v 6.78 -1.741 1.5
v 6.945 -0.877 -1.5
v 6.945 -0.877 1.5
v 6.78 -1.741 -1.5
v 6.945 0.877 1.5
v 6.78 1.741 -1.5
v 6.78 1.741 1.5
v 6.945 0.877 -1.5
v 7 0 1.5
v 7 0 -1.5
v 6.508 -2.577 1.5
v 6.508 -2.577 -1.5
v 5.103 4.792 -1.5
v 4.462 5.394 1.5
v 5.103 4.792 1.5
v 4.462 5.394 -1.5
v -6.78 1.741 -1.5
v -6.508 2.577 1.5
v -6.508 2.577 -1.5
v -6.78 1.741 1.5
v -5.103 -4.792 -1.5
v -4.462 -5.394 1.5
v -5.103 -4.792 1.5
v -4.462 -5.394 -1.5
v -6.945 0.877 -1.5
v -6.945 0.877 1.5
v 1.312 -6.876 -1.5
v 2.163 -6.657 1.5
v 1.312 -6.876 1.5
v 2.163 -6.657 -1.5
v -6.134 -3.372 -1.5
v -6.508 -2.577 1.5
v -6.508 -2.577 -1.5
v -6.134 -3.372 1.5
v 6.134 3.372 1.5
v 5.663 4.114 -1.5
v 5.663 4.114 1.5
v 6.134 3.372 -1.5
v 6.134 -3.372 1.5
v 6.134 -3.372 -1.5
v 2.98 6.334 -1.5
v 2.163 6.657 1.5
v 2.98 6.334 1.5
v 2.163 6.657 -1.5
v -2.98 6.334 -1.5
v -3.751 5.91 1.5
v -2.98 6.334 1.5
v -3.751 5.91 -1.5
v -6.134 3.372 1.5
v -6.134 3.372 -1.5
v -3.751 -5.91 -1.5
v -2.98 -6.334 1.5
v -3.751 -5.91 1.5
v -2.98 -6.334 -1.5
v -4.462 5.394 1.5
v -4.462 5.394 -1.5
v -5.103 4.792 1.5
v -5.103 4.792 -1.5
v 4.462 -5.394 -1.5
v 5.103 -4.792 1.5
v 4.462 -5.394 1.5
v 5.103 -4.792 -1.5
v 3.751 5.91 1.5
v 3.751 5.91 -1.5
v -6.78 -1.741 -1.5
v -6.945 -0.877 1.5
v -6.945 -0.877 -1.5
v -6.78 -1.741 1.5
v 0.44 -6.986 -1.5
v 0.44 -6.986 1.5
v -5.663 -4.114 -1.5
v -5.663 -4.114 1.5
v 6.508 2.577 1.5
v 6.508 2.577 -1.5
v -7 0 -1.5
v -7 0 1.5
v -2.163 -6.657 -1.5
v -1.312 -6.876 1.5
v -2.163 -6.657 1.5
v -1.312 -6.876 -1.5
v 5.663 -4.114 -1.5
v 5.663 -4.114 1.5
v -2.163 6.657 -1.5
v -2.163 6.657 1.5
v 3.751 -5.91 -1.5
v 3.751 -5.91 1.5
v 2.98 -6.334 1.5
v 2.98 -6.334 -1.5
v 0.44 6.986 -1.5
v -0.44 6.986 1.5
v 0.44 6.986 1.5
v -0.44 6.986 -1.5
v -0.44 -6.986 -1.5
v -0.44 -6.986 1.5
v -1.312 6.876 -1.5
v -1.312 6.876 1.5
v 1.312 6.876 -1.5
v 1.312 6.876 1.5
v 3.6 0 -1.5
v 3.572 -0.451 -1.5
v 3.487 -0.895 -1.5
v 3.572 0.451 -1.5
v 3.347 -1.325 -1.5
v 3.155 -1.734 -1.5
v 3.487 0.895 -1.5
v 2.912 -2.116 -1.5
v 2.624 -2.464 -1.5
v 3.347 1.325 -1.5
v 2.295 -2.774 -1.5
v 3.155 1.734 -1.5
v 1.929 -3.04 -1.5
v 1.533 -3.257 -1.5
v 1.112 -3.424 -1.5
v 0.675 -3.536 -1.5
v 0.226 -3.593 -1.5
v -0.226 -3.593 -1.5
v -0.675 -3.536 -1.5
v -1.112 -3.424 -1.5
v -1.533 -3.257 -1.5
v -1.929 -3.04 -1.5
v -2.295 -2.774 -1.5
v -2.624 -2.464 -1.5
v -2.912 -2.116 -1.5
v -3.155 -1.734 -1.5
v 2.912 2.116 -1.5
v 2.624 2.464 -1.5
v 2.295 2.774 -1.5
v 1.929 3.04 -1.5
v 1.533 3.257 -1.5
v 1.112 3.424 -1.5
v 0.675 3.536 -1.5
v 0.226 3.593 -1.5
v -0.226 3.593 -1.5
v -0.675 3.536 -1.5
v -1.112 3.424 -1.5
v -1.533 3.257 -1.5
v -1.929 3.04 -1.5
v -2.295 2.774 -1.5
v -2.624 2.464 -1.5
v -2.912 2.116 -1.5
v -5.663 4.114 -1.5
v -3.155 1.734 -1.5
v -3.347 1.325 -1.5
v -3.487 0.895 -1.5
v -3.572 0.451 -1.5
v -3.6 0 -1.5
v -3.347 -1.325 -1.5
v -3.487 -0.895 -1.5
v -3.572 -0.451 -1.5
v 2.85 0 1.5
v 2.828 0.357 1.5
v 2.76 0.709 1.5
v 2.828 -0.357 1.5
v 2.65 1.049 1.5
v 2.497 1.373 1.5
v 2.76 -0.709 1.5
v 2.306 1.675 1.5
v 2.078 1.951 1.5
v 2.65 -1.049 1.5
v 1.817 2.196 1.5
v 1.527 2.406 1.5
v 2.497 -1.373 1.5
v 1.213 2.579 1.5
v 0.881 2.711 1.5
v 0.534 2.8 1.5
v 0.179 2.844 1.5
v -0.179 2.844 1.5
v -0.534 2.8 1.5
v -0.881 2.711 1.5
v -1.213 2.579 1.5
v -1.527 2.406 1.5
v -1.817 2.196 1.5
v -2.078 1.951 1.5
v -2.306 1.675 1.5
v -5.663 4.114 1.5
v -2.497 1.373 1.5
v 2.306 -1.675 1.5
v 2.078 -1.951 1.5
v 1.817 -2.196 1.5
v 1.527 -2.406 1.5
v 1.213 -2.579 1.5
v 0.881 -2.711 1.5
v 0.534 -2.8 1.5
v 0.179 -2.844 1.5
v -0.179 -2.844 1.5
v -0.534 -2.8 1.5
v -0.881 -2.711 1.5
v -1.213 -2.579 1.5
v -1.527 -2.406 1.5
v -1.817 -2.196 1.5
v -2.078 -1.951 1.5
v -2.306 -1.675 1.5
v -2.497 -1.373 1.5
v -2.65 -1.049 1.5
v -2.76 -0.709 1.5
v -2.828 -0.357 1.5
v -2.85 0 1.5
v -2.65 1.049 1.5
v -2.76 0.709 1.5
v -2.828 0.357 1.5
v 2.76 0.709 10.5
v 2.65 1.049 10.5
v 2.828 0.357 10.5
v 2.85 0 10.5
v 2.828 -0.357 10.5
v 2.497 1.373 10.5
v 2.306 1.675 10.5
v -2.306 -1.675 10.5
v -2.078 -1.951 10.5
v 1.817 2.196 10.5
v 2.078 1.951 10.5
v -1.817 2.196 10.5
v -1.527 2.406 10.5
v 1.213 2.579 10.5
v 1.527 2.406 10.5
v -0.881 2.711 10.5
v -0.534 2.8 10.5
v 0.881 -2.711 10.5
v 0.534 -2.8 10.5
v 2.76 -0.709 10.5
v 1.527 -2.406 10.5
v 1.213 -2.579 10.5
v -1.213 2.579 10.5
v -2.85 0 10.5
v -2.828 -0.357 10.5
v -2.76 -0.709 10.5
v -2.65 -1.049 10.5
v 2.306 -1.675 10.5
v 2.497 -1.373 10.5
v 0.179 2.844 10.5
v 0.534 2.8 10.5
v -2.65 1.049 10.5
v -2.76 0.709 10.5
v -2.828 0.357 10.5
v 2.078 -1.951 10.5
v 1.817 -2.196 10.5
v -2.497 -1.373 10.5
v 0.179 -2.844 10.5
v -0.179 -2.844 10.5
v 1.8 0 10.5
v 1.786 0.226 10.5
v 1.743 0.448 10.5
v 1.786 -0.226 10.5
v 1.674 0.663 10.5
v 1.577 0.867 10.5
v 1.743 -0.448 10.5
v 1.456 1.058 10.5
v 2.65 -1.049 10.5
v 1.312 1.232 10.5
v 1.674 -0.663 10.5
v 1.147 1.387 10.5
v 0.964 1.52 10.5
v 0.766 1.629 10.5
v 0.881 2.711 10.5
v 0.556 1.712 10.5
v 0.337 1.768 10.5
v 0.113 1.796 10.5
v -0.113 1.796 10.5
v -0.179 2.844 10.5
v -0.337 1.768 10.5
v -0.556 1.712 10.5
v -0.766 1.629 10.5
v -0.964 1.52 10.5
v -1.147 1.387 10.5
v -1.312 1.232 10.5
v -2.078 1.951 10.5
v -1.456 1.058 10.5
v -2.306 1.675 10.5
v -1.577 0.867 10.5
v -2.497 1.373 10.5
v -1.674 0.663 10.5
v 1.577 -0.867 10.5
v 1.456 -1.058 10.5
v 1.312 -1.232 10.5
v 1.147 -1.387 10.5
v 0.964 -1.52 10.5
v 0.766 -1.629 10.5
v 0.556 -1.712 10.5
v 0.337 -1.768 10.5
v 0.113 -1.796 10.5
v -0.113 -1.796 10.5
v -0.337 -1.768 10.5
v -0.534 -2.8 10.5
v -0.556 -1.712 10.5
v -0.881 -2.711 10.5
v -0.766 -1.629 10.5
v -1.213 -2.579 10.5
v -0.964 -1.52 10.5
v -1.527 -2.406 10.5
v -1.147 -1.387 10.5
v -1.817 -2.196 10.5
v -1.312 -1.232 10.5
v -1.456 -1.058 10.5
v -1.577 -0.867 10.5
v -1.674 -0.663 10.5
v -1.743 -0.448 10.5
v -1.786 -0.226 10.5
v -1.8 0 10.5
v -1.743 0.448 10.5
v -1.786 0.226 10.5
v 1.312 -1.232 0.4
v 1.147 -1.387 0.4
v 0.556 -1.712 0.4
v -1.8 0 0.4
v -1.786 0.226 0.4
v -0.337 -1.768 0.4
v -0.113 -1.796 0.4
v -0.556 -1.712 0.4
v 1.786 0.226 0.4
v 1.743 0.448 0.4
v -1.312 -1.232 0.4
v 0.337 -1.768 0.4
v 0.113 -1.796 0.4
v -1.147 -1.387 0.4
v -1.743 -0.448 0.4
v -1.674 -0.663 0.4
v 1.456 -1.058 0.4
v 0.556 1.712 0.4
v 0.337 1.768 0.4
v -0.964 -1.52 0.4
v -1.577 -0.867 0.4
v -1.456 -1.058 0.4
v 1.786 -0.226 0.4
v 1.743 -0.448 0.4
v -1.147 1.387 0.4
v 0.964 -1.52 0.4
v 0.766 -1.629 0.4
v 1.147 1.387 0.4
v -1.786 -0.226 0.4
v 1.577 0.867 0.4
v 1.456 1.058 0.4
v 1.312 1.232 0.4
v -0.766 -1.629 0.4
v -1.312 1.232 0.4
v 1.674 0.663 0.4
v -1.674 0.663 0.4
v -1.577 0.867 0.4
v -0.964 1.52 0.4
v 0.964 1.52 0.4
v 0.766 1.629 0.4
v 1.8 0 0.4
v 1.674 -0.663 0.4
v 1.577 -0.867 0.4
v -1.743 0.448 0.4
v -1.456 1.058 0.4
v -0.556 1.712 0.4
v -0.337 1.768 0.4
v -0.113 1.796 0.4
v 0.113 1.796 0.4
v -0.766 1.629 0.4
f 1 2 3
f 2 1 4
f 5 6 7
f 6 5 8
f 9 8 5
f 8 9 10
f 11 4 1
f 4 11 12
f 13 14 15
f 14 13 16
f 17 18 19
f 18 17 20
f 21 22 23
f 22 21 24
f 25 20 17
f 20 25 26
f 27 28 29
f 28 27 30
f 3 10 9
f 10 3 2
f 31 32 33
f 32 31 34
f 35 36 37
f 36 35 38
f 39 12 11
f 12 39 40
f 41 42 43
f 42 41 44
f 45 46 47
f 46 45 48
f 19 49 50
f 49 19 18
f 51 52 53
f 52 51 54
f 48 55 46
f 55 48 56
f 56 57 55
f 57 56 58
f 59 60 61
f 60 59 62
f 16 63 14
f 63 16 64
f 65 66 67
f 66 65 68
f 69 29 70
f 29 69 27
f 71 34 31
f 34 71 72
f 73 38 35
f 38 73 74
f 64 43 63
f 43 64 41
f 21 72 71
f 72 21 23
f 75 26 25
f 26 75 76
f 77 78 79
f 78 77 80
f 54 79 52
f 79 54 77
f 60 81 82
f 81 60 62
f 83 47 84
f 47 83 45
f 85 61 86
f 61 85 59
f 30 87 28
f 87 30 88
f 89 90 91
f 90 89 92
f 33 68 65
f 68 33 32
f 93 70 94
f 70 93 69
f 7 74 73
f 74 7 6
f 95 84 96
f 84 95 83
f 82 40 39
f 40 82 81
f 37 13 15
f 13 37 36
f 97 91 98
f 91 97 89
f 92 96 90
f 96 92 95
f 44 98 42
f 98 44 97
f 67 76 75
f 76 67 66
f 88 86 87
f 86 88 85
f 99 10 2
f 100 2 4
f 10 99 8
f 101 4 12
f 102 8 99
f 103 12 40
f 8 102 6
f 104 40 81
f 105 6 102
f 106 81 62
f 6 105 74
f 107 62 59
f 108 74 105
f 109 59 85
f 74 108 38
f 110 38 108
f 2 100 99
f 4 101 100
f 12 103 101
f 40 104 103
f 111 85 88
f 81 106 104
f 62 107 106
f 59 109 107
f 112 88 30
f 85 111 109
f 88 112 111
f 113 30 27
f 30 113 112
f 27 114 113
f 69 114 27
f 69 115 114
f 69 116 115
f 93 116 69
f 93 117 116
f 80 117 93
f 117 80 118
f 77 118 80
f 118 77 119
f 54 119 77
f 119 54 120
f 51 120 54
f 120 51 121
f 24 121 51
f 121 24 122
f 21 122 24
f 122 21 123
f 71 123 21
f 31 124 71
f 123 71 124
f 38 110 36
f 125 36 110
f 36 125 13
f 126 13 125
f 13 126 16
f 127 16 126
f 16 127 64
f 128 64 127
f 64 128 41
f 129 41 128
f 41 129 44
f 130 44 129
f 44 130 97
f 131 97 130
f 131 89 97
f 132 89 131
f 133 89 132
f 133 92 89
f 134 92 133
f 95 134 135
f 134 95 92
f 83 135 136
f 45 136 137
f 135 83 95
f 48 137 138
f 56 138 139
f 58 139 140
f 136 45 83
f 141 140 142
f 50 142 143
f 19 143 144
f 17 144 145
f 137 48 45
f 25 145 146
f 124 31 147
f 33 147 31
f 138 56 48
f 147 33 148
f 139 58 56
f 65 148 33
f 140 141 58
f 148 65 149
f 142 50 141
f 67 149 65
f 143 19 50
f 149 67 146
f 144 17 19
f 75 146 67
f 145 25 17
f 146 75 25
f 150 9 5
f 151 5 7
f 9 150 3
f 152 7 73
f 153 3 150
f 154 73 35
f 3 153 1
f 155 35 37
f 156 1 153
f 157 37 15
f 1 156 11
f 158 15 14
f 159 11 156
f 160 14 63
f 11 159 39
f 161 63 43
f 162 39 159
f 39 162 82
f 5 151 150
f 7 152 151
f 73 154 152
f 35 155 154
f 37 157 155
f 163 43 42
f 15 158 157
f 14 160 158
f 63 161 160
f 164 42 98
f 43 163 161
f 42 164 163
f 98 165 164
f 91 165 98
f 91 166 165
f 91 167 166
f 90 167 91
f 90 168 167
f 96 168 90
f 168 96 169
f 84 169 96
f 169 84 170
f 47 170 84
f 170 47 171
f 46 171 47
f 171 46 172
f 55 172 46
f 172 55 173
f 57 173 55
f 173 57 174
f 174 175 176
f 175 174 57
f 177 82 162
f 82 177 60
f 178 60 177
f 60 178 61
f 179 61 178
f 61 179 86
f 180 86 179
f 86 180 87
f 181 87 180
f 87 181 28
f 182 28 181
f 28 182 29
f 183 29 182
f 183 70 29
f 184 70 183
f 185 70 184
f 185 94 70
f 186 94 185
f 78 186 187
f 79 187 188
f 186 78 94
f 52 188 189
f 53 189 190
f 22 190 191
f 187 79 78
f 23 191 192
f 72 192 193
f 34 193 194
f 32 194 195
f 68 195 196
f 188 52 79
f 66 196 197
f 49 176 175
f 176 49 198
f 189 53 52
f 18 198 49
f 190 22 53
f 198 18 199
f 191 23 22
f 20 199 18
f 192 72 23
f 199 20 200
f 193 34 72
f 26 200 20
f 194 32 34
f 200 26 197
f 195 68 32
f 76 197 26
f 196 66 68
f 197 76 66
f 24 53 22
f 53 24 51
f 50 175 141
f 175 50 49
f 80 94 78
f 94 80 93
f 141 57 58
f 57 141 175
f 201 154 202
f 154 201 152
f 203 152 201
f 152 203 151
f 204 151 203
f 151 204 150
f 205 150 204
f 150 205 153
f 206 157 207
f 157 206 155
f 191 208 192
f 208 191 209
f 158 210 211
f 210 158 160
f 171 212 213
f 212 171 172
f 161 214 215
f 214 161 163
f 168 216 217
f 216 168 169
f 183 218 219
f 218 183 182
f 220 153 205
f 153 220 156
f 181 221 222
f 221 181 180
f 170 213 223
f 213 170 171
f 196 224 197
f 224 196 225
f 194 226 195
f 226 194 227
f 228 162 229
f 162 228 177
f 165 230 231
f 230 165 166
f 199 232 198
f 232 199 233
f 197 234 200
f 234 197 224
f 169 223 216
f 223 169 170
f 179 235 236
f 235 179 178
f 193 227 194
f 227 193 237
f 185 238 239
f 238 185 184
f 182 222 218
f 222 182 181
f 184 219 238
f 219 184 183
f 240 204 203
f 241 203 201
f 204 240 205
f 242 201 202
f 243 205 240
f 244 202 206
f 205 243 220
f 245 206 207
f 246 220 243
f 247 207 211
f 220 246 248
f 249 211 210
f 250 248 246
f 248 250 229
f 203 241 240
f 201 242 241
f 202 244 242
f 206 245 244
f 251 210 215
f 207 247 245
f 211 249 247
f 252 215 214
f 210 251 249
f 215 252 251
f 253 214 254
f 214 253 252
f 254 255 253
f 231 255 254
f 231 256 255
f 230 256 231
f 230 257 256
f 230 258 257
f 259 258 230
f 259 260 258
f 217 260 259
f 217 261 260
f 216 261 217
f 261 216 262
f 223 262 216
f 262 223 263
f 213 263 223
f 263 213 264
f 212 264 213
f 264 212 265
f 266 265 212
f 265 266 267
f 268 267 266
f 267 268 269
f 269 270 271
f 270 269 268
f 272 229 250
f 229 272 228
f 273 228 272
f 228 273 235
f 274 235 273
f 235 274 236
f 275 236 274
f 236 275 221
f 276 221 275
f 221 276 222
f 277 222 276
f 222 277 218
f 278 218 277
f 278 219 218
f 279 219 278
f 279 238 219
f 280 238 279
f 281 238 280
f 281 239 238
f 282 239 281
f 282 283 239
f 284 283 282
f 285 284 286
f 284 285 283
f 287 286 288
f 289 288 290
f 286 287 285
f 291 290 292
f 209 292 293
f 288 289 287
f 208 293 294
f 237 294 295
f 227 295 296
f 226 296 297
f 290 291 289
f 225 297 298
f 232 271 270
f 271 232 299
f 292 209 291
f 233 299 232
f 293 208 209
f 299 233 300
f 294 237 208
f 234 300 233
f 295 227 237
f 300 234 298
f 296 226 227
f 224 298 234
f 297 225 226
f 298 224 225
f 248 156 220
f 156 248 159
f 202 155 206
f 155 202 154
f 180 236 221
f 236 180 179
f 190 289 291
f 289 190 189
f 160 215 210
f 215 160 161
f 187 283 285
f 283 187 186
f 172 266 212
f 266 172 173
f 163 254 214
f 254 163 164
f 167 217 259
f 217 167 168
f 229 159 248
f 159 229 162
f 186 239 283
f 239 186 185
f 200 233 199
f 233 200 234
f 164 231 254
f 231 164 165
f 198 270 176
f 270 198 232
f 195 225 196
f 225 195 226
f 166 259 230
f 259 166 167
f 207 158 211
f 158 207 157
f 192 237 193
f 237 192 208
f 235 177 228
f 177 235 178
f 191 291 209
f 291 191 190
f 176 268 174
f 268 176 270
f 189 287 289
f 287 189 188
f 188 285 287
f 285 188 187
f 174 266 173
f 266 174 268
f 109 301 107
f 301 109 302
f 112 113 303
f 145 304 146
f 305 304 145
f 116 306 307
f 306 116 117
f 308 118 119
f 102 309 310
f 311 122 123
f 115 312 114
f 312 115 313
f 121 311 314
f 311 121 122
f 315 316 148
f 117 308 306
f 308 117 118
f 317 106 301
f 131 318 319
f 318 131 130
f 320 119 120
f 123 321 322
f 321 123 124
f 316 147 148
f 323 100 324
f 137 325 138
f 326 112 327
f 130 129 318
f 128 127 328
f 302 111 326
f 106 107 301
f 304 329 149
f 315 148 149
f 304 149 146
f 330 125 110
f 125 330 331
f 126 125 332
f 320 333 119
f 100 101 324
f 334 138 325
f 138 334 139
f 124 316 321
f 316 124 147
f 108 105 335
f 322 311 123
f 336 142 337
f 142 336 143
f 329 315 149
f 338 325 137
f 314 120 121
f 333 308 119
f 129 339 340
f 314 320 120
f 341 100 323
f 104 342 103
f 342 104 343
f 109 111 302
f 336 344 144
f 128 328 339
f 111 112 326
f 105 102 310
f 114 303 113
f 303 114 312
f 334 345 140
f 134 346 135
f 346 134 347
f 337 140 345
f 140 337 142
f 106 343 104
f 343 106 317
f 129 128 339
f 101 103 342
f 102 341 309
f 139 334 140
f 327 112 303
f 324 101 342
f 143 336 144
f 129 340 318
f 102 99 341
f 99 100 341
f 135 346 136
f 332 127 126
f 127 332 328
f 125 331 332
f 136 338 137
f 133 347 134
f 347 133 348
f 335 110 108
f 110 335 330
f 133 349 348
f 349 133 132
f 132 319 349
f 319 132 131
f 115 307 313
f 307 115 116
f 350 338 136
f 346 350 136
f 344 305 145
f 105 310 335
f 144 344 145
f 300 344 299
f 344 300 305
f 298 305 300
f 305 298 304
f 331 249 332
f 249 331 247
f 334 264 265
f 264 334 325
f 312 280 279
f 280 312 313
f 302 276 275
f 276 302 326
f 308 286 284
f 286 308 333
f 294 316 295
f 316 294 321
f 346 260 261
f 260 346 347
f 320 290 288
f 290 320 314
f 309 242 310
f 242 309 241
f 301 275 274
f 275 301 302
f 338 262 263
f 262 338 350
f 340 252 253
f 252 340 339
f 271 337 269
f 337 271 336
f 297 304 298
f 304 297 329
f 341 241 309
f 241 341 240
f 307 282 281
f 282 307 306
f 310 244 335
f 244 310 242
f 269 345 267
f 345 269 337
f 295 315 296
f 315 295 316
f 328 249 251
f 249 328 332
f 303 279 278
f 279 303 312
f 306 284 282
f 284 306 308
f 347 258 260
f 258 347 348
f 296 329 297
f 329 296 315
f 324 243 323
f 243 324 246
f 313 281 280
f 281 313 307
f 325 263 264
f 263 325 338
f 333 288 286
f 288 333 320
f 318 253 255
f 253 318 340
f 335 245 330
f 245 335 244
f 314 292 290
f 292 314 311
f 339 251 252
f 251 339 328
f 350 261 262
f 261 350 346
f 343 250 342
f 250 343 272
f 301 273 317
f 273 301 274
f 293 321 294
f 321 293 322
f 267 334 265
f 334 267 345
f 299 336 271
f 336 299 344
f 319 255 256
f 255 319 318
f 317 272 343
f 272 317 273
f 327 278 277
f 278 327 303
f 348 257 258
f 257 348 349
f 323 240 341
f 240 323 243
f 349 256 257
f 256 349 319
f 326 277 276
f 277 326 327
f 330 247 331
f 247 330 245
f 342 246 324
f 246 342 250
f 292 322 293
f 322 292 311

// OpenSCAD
$fn = 50;


difference() {
	union() {
		translate(v = [0, 0, -1.5000000000]) {
			cylinder(h = 3, r = 7.0000000000);
		}
		translate(v = [0, 0, -1.5000000000]) {
			cylinder(h = 12, r = 2.8500000000);
		}
	}
	union() {
		translate(v = [0, 0, -1.5000000000]) {
			rotate(a = [0, 180, 0]) {
				difference() {
					union() {
						translate(v = [0, 0, -12.0000000000]) {
							cylinder(h = 12, r = 1.5000000000);
						}
						translate(v = [0, 0, -1.9000000000]) {
							cylinder(h = 1.9000000000, r1 = 1.8000000000, r2 = 3.6000000000);
						}
						translate(v = [0, 0, -12.0000000000]) {
							cylinder(h = 12, r = 1.8000000000);
						}
						translate(v = [0, 0, -12.0000000000]) {
							cylinder(h = 12, r = 1.5000000000);
						}
					}
					union();
				}
			}
		}
		translate(v = [0, 0, -100.0000000000]) {
			cylinder(h = 200, r = 1.8000000000);
		}
	}
}
